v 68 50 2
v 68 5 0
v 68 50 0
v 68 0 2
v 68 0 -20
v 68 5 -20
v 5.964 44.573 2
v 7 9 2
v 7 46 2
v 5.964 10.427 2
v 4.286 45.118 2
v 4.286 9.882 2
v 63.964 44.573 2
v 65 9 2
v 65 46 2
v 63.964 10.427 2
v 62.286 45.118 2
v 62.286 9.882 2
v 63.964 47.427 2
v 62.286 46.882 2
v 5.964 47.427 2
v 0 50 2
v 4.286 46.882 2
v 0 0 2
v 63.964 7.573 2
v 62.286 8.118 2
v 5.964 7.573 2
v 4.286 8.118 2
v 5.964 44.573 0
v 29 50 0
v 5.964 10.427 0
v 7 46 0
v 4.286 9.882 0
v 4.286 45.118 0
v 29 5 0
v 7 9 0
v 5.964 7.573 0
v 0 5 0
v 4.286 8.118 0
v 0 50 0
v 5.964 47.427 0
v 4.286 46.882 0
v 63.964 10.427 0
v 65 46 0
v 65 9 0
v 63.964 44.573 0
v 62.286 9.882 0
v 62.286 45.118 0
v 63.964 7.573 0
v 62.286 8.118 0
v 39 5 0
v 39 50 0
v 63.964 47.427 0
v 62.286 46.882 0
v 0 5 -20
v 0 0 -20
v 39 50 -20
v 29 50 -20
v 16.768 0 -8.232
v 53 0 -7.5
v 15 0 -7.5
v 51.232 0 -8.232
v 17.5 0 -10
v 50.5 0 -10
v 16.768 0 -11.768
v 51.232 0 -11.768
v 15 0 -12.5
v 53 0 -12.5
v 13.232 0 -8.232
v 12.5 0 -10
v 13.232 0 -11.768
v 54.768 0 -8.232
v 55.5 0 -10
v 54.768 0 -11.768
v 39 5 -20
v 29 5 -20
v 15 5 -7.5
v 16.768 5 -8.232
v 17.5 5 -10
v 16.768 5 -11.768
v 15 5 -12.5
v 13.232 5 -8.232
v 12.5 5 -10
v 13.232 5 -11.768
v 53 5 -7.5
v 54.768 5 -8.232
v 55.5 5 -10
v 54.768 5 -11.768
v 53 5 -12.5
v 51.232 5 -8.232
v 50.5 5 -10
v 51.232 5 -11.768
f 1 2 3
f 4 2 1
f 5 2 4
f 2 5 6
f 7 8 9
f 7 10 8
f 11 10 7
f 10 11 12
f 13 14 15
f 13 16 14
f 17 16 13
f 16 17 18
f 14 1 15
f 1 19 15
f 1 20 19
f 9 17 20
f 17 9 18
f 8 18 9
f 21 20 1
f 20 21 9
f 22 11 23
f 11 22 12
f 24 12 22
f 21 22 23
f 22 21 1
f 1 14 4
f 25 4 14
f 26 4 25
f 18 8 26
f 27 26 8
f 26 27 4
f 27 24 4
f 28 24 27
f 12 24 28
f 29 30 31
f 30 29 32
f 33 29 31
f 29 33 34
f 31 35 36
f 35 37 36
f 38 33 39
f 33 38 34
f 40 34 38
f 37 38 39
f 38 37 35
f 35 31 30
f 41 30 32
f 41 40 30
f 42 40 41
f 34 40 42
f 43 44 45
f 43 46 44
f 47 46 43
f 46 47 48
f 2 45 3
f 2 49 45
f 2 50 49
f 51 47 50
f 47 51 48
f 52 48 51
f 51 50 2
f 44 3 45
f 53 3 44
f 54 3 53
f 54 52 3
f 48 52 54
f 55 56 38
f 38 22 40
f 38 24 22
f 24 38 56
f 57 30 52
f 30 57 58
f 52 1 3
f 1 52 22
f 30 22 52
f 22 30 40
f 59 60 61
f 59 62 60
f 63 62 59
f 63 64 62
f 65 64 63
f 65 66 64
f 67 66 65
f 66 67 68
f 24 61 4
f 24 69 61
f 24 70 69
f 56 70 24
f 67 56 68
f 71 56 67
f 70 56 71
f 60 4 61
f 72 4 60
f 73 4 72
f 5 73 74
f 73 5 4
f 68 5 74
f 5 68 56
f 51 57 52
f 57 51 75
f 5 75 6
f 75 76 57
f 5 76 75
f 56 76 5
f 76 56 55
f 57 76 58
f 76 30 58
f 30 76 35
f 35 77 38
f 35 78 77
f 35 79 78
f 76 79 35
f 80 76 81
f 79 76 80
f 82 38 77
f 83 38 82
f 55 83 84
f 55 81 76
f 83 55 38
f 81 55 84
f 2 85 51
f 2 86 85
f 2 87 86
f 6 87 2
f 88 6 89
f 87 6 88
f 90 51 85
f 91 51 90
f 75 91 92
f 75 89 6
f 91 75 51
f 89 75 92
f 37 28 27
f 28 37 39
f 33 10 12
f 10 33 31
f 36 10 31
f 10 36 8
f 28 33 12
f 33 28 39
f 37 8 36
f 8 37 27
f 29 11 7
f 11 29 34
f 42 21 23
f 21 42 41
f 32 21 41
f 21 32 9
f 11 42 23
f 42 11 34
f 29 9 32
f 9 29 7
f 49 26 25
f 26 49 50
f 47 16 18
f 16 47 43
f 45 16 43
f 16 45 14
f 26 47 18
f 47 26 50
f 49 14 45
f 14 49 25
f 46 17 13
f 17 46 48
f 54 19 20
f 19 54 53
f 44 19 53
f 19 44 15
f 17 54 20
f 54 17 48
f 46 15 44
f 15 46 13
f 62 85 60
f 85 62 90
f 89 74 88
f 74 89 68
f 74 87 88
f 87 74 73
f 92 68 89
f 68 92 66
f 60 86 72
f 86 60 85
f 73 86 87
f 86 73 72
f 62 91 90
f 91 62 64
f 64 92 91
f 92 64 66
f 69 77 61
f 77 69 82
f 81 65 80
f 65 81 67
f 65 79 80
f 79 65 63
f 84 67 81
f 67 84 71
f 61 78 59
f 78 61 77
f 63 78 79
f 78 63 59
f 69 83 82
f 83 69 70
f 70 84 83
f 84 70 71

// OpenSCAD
// Converter Holder

xspacing = 58;
yspacing = 37;

module conv_body()
{
	cube([68,50,2]);
	translate([27.5+1.5,0,-20]) cube([10,50,20]);
	rotate([0,0,0]) translate([0,0,-20]) cube([68,5,20]);
	
}


module conv_cuts()
{
	x1 = 5.5;
	x2 = x1 + xspacing;
	y1 = 9;
	y2 = y1 + yspacing;
	
	translate([x1,y1,-.1]) cylinder(r=1.5,h=6);
	translate([x1,y2,-.1]) cylinder(r=1.5,h=6);
	translate([x2,y1,-.1]) cylinder(r=1.5,h=6);
	translate([x2,y2,-.1]) cylinder(r=1.5,h=6);
	
        translate([53,-1,-10]) rotate([270,0,0]) cylinder(r=2.5,h=7);
	translate([15,-1,-10]) rotate([270,0,0]) cylinder(r=2.5,h=7);
}

module conv()
{
	difference()
	{
		conv_body();
		conv_cuts();
	}
	
	
}

conv()
{
	
	
}
